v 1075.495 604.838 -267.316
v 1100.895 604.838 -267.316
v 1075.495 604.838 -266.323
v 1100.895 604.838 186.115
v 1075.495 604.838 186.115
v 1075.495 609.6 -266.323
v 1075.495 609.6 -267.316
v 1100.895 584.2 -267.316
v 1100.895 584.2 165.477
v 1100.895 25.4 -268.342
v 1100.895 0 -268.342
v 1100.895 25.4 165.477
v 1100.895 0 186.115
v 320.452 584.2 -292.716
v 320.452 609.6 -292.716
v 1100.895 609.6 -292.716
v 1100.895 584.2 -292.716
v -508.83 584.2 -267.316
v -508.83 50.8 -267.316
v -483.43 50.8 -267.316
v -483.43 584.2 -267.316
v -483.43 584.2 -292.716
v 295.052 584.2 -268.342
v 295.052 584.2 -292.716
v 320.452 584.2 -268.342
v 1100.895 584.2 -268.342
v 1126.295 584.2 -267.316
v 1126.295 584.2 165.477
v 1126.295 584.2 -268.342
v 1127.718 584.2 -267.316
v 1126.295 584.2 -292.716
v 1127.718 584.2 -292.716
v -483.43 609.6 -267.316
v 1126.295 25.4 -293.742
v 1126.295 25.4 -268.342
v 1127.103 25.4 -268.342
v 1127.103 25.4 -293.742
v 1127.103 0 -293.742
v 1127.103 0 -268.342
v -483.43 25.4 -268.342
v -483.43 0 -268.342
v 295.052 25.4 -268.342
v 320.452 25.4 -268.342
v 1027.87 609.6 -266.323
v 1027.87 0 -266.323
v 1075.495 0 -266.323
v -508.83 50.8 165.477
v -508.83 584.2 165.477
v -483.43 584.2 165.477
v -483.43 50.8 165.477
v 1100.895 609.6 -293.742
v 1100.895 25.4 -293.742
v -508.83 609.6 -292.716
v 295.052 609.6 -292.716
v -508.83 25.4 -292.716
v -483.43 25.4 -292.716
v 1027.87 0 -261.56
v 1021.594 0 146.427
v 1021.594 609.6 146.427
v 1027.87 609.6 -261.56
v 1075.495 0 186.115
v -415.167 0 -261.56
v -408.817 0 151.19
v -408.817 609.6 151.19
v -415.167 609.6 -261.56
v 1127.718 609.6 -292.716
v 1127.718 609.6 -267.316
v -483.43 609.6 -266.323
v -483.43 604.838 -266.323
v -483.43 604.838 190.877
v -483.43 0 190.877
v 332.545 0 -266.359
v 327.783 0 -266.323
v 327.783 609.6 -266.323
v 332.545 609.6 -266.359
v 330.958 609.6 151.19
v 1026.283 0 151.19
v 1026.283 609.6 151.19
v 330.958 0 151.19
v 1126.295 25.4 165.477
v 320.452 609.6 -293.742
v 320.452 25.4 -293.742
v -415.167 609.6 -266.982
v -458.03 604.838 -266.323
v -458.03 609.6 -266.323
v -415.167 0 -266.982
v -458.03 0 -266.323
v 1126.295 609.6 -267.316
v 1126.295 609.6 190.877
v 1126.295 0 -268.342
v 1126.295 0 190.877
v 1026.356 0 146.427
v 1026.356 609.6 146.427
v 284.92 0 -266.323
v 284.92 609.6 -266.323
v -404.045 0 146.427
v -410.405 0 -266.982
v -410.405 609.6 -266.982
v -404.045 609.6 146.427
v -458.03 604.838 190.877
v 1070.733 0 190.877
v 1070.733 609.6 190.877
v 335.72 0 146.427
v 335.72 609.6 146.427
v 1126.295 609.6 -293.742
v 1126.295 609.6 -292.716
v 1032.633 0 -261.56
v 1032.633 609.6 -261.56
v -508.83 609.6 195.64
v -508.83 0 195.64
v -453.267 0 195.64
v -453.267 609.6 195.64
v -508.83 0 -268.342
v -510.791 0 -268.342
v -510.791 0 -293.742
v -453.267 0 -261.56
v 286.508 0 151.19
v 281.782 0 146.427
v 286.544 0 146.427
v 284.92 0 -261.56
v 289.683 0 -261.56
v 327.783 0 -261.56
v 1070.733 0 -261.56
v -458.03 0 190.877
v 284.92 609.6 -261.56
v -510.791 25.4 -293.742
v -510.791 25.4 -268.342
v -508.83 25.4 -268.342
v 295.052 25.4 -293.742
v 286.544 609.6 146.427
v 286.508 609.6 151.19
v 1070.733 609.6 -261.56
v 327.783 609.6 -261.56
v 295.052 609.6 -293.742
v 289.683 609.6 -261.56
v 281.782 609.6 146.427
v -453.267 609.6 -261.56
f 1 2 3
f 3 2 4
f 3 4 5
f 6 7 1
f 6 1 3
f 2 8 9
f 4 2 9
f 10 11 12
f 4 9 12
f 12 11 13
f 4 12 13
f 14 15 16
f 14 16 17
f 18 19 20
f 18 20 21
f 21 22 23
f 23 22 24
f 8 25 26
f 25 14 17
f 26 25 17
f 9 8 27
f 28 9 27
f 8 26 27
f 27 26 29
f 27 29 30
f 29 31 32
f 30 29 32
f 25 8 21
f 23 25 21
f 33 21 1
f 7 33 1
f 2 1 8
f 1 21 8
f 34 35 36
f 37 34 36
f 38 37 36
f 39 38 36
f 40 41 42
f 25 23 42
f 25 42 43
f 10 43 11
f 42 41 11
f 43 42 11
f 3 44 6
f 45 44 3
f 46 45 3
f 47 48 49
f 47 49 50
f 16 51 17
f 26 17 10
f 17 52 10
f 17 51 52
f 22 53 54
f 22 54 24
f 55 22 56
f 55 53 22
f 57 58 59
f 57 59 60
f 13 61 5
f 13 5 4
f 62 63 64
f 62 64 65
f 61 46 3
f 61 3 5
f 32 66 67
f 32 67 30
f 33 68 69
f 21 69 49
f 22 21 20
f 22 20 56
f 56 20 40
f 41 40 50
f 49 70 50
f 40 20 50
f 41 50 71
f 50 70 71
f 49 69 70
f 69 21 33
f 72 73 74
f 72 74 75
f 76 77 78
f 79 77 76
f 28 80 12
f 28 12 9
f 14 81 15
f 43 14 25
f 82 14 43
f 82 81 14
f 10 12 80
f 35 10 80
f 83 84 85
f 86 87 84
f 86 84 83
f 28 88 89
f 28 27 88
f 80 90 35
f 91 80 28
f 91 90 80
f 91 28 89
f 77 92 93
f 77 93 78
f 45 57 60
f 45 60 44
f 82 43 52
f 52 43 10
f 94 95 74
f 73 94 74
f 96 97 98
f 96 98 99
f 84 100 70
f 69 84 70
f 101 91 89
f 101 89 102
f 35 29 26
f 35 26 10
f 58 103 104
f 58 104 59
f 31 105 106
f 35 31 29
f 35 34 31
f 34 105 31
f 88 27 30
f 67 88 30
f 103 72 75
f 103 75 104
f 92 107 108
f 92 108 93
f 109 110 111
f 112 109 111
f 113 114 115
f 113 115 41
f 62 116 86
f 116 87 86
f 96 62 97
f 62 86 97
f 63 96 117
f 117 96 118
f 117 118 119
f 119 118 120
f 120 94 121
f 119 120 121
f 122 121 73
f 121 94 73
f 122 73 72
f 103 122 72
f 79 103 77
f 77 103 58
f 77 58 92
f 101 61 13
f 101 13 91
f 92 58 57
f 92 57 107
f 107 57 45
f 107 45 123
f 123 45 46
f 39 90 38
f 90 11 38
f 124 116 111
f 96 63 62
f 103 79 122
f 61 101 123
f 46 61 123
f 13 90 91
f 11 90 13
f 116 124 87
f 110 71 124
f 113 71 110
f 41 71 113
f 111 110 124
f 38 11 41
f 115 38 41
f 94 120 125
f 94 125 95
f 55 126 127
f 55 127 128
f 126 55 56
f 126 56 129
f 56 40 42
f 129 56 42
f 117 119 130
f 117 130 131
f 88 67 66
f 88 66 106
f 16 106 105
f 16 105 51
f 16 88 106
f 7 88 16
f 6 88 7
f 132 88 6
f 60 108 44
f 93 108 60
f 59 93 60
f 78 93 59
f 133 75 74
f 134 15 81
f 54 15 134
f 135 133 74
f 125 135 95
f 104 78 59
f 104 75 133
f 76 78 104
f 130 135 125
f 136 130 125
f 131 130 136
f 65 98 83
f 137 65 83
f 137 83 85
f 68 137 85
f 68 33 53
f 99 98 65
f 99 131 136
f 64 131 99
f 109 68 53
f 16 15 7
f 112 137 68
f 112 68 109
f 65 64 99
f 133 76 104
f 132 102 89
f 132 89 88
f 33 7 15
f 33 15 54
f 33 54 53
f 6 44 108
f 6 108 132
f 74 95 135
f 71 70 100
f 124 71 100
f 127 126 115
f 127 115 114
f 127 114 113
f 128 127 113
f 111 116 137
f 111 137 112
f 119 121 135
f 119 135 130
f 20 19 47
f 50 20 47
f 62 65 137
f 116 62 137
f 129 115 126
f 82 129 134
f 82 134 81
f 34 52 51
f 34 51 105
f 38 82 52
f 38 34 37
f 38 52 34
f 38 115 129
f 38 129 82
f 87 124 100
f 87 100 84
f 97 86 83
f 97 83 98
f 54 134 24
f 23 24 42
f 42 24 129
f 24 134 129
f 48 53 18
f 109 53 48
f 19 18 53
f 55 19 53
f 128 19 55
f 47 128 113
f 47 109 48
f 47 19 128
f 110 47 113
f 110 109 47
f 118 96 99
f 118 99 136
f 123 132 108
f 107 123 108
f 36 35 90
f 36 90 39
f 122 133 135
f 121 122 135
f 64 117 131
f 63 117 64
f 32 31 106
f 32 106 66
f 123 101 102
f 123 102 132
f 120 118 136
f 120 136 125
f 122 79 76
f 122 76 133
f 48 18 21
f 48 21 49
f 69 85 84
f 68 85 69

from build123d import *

# Parameters (mm, degrees)
F0_W      = 4.7625
F0_H      = 457.2
F1_DEPTH  = 609.6
F2_W      = 50.8
F2_H      = 4.7625
F3_DEPTH  = 609.6
F4_DEPTH  = 609.6
F5_W      = 25.4
F5_H      = 461.9625
F6_DEPTH  = 25.4
F8_DEPTH  = 25.4
F9_W      = 1637.8936
F9_H      = 25.4
F10_DEPTH = 25.4
F11_W     = 25.4
F11_H     = 433.81924
F12_DEPTH = 25.4
F13_DEPTH = 25.4
F14_W     = 25.4
F14_H     = 432.793116
F15_DEPTH = 25.4
F16_W     = 1636.5474
F16_H     = 25.4
F17_DEPTH = 25.4
F18_W     = 25.4
F18_H     = 609.6
F19_DEPTH = 25.4
F20_W     = 50.8
F20_H     = 453.430616
F21_DEPTH = 4.7625
F22_W     = 25.4
F22_H     = 457.2
F23_DEPTH = 4.7625


with BuildPart() as f1:
    # F0 (on Front) → F1 (new body)
    with BuildSketch(Plane.XZ):
        with Locations((-455.648437, -32.960023)):
            Rectangle(F0_W, F0_H)
        Polygon((-415.167187, -261.560023), (-453.267187, -261.560023), (-458.029687, -261.560023), (-458.029687, -266.322523), (-415.167187, -266.981946), align=None)
        Polygon((-408.817187, 151.189977), (-415.167187, -261.560023), (-415.167187, -266.981946), (-410.404687, -266.981946), (-404.044542, 146.427477), (-408.817187, 146.427477), align=None)
        Polygon((-403.971273, 151.189977), (-408.817187, 151.189977), (-408.817187, 146.427477), (-404.044542, 146.427477), align=None)
        Polygon((286.507813, 151.189977), (-403.971273, 151.189977), (-404.044542, 146.427477), (281.781948, 146.427477), (286.544448, 146.427477), align=None)
        Polygon((289.682813, -261.560023), (286.544448, 146.427477), (281.781948, 146.427477), (284.920313, -261.560023), align=None)
        Polygon((327.782813, -261.560023), (289.682813, -261.560023), (284.920313, -261.560023), (284.920313, -266.322523), (327.782813, -266.322523), align=None)
        Polygon((330.957813, 151.189977), (327.782813, -261.560023), (327.782813, -266.322523), (332.545172, -266.359156), (335.720454, 146.427477), (330.957813, 146.427477), align=None)
        Polygon((335.757089, 151.189977), (330.957813, 151.189977), (330.957813, 146.427477), (335.720454, 146.427477), align=None)
        Polygon((1021.520313, 151.189977), (335.757089, 151.189977), (335.720454, 146.427477), (1021.593582, 146.427477), align=None)
        Polygon((1026.282813, 151.189977), (1021.520313, 151.189977), (1021.593582, 146.427477), (1026.356082, 146.427477), align=None)
        Polygon((1026.356082, 146.427477), (1021.593582, 146.427477), (1027.870313, -261.560023), (1032.632813, -261.560023), align=None)
        Polygon((1032.632813, -261.560023), (1027.870313, -261.560023), (1027.870313, -266.322523), (1070.732813, -266.322523), (1070.732813, -261.560023), align=None)
        Polygon((1070.732813, 190.877477), (1070.732813, -261.560023), (1070.732813, -266.322523), (1075.495313, -266.322523), (1075.495313, 190.877477), align=None)
    extrude(amount=-F1_DEPTH)

    # F2 (on face) → F3 (join)
    with BuildSketch(Plane.XZ):
        with Locations((-483.429687, 193.258727)):
            Rectangle(F2_W, F2_H)
    extrude(amount=-F3_DEPTH)

    # F2 (on face) → F4 (join)
    with BuildSketch(Plane.XZ):
        with Locations((-483.429687, 193.258727)):
            Rectangle(F2_W, F2_H)
        with Locations((1100.895313, 188.496227)):
            Rectangle(F2_W, F2_H)
    extrude(amount=-F4_DEPTH)

    # F5 (on face) → F6 (join)
    with BuildSketch(Plane.XZ):
        with Locations((-496.129687, -40.103773)):
            Rectangle(F5_W, F5_H)
        with Locations((1113.595313, -44.866273)):
            Rectangle(F5_W, F5_H)
    extrude(amount=-F6_DEPTH)

    # F5 (on face) → F8 (join)
    with BuildSketch(Plane.XZ):
        with Locations((-496.129687, -40.103773)):
            Rectangle(F5_W, F5_H)
        with Locations((1113.595313, -44.866273)):
            Rectangle(F5_W, F5_H)
    extrude(amount=-F8_DEPTH)

    # F9 (on face) → F10 (join)
    with BuildSketch(Plane.XZ):
        with Locations((308.156171, -281.041763)):
            Rectangle(F9_W, F9_H)
    extrude(amount=-F10_DEPTH)

    # F11 (on face) → F12 (join)
    with BuildSketch(Plane.YZ.offset(1126.295313)):
        Polygon((609.6, 190.877477), (0, 190.877477), (0, 165.477477), (584.2, 165.477477), (609.6, 165.477477), align=None)
        with Locations((596.9, -51.432143)):
            Rectangle(F11_W, F11_H)
        Polygon((609.6, -293.741763), (609.6, -268.341763), (584.2, -268.341763), (25.4, -268.341763), (25.4, -293.741763), align=None)
    extrude(amount=-F12_DEPTH)

    # F11 (on face) → F13 (join)
    with BuildSketch(Plane.YZ.offset(1126.295313)):
        Polygon((609.6, 190.877477), (0, 190.877477), (0, 165.477477), (584.2, 165.477477), (609.6, 165.477477), align=None)
        with Locations((596.9, -51.432143)):
            Rectangle(F11_W, F11_H)
        Polygon((609.6, -293.741763), (609.6, -268.341763), (584.2, -268.341763), (25.4, -268.341763), (25.4, -293.741763), align=None)
    extrude(amount=-F13_DEPTH)

    # F14 (on face) → F15 (join)
    with BuildSketch(Plane(origin=(-508.829687, 0, 0), x_dir=(0, -1, 0), z_dir=(-1, 0, 0))):
        Polygon((-25.4, 165.477477), (-25.4, 190.877477), (-609.6, 190.877477), (-609.6, 165.477477), (-584.2, 165.477477), (-50.8, 165.477477), align=None)
        with Locations((-38.1, -50.919081)):
            Rectangle(F14_W, F14_H)
        with Locations((-596.9, -50.919081)):
            Rectangle(F14_W, F14_H)
        Polygon((-25.4, -292.715639), (-25.4, -267.315639), (-50.8, -267.315639), (-584.2, -267.315639), (-609.6, -267.315639), (-609.6, -292.715639), align=None)
    extrude(amount=-F15_DEPTH)

    # F16 (on face) → F17 (join)
    with BuildSketch(Plane(origin=(0, 0, -292.715639), x_dir=(1, 0, 0), z_dir=(0, 0, -1))):
        with Locations((309.444013, -596.9)):
            Rectangle(F16_W, F16_H)
    extrude(amount=-F17_DEPTH)

    # F18 (on face) → F19 (join)
    with BuildSketch(Plane(origin=(0, 0, -293.741763), x_dir=(1, 0, 0), z_dir=(0, 0, -1))):
        with Locations((307.752342, -304.8)):
            Rectangle(F18_W, F18_H)
    extrude(amount=-F19_DEPTH)

    # F20 (on face) → F21 (join)
    with BuildSketch(Plane(origin=(0, 609.6, 0), x_dir=(-1, 0, 0), z_dir=(0, 1, 0))):
        with Locations((-1100.895313, -40.600331)):
            Rectangle(F20_W, F20_H)
    extrude(amount=-F21_DEPTH)

    # F22 (on face) → F23 (join)
    with BuildSketch(Plane(origin=(0, 609.6, 0), x_dir=(-1, 0, 0), z_dir=(0, 1, 0))):
        with Locations((470.729687, -37.722523)):
            Rectangle(F22_W, F22_H)
    extrude(amount=-F23_DEPTH)


solid = f1.part
